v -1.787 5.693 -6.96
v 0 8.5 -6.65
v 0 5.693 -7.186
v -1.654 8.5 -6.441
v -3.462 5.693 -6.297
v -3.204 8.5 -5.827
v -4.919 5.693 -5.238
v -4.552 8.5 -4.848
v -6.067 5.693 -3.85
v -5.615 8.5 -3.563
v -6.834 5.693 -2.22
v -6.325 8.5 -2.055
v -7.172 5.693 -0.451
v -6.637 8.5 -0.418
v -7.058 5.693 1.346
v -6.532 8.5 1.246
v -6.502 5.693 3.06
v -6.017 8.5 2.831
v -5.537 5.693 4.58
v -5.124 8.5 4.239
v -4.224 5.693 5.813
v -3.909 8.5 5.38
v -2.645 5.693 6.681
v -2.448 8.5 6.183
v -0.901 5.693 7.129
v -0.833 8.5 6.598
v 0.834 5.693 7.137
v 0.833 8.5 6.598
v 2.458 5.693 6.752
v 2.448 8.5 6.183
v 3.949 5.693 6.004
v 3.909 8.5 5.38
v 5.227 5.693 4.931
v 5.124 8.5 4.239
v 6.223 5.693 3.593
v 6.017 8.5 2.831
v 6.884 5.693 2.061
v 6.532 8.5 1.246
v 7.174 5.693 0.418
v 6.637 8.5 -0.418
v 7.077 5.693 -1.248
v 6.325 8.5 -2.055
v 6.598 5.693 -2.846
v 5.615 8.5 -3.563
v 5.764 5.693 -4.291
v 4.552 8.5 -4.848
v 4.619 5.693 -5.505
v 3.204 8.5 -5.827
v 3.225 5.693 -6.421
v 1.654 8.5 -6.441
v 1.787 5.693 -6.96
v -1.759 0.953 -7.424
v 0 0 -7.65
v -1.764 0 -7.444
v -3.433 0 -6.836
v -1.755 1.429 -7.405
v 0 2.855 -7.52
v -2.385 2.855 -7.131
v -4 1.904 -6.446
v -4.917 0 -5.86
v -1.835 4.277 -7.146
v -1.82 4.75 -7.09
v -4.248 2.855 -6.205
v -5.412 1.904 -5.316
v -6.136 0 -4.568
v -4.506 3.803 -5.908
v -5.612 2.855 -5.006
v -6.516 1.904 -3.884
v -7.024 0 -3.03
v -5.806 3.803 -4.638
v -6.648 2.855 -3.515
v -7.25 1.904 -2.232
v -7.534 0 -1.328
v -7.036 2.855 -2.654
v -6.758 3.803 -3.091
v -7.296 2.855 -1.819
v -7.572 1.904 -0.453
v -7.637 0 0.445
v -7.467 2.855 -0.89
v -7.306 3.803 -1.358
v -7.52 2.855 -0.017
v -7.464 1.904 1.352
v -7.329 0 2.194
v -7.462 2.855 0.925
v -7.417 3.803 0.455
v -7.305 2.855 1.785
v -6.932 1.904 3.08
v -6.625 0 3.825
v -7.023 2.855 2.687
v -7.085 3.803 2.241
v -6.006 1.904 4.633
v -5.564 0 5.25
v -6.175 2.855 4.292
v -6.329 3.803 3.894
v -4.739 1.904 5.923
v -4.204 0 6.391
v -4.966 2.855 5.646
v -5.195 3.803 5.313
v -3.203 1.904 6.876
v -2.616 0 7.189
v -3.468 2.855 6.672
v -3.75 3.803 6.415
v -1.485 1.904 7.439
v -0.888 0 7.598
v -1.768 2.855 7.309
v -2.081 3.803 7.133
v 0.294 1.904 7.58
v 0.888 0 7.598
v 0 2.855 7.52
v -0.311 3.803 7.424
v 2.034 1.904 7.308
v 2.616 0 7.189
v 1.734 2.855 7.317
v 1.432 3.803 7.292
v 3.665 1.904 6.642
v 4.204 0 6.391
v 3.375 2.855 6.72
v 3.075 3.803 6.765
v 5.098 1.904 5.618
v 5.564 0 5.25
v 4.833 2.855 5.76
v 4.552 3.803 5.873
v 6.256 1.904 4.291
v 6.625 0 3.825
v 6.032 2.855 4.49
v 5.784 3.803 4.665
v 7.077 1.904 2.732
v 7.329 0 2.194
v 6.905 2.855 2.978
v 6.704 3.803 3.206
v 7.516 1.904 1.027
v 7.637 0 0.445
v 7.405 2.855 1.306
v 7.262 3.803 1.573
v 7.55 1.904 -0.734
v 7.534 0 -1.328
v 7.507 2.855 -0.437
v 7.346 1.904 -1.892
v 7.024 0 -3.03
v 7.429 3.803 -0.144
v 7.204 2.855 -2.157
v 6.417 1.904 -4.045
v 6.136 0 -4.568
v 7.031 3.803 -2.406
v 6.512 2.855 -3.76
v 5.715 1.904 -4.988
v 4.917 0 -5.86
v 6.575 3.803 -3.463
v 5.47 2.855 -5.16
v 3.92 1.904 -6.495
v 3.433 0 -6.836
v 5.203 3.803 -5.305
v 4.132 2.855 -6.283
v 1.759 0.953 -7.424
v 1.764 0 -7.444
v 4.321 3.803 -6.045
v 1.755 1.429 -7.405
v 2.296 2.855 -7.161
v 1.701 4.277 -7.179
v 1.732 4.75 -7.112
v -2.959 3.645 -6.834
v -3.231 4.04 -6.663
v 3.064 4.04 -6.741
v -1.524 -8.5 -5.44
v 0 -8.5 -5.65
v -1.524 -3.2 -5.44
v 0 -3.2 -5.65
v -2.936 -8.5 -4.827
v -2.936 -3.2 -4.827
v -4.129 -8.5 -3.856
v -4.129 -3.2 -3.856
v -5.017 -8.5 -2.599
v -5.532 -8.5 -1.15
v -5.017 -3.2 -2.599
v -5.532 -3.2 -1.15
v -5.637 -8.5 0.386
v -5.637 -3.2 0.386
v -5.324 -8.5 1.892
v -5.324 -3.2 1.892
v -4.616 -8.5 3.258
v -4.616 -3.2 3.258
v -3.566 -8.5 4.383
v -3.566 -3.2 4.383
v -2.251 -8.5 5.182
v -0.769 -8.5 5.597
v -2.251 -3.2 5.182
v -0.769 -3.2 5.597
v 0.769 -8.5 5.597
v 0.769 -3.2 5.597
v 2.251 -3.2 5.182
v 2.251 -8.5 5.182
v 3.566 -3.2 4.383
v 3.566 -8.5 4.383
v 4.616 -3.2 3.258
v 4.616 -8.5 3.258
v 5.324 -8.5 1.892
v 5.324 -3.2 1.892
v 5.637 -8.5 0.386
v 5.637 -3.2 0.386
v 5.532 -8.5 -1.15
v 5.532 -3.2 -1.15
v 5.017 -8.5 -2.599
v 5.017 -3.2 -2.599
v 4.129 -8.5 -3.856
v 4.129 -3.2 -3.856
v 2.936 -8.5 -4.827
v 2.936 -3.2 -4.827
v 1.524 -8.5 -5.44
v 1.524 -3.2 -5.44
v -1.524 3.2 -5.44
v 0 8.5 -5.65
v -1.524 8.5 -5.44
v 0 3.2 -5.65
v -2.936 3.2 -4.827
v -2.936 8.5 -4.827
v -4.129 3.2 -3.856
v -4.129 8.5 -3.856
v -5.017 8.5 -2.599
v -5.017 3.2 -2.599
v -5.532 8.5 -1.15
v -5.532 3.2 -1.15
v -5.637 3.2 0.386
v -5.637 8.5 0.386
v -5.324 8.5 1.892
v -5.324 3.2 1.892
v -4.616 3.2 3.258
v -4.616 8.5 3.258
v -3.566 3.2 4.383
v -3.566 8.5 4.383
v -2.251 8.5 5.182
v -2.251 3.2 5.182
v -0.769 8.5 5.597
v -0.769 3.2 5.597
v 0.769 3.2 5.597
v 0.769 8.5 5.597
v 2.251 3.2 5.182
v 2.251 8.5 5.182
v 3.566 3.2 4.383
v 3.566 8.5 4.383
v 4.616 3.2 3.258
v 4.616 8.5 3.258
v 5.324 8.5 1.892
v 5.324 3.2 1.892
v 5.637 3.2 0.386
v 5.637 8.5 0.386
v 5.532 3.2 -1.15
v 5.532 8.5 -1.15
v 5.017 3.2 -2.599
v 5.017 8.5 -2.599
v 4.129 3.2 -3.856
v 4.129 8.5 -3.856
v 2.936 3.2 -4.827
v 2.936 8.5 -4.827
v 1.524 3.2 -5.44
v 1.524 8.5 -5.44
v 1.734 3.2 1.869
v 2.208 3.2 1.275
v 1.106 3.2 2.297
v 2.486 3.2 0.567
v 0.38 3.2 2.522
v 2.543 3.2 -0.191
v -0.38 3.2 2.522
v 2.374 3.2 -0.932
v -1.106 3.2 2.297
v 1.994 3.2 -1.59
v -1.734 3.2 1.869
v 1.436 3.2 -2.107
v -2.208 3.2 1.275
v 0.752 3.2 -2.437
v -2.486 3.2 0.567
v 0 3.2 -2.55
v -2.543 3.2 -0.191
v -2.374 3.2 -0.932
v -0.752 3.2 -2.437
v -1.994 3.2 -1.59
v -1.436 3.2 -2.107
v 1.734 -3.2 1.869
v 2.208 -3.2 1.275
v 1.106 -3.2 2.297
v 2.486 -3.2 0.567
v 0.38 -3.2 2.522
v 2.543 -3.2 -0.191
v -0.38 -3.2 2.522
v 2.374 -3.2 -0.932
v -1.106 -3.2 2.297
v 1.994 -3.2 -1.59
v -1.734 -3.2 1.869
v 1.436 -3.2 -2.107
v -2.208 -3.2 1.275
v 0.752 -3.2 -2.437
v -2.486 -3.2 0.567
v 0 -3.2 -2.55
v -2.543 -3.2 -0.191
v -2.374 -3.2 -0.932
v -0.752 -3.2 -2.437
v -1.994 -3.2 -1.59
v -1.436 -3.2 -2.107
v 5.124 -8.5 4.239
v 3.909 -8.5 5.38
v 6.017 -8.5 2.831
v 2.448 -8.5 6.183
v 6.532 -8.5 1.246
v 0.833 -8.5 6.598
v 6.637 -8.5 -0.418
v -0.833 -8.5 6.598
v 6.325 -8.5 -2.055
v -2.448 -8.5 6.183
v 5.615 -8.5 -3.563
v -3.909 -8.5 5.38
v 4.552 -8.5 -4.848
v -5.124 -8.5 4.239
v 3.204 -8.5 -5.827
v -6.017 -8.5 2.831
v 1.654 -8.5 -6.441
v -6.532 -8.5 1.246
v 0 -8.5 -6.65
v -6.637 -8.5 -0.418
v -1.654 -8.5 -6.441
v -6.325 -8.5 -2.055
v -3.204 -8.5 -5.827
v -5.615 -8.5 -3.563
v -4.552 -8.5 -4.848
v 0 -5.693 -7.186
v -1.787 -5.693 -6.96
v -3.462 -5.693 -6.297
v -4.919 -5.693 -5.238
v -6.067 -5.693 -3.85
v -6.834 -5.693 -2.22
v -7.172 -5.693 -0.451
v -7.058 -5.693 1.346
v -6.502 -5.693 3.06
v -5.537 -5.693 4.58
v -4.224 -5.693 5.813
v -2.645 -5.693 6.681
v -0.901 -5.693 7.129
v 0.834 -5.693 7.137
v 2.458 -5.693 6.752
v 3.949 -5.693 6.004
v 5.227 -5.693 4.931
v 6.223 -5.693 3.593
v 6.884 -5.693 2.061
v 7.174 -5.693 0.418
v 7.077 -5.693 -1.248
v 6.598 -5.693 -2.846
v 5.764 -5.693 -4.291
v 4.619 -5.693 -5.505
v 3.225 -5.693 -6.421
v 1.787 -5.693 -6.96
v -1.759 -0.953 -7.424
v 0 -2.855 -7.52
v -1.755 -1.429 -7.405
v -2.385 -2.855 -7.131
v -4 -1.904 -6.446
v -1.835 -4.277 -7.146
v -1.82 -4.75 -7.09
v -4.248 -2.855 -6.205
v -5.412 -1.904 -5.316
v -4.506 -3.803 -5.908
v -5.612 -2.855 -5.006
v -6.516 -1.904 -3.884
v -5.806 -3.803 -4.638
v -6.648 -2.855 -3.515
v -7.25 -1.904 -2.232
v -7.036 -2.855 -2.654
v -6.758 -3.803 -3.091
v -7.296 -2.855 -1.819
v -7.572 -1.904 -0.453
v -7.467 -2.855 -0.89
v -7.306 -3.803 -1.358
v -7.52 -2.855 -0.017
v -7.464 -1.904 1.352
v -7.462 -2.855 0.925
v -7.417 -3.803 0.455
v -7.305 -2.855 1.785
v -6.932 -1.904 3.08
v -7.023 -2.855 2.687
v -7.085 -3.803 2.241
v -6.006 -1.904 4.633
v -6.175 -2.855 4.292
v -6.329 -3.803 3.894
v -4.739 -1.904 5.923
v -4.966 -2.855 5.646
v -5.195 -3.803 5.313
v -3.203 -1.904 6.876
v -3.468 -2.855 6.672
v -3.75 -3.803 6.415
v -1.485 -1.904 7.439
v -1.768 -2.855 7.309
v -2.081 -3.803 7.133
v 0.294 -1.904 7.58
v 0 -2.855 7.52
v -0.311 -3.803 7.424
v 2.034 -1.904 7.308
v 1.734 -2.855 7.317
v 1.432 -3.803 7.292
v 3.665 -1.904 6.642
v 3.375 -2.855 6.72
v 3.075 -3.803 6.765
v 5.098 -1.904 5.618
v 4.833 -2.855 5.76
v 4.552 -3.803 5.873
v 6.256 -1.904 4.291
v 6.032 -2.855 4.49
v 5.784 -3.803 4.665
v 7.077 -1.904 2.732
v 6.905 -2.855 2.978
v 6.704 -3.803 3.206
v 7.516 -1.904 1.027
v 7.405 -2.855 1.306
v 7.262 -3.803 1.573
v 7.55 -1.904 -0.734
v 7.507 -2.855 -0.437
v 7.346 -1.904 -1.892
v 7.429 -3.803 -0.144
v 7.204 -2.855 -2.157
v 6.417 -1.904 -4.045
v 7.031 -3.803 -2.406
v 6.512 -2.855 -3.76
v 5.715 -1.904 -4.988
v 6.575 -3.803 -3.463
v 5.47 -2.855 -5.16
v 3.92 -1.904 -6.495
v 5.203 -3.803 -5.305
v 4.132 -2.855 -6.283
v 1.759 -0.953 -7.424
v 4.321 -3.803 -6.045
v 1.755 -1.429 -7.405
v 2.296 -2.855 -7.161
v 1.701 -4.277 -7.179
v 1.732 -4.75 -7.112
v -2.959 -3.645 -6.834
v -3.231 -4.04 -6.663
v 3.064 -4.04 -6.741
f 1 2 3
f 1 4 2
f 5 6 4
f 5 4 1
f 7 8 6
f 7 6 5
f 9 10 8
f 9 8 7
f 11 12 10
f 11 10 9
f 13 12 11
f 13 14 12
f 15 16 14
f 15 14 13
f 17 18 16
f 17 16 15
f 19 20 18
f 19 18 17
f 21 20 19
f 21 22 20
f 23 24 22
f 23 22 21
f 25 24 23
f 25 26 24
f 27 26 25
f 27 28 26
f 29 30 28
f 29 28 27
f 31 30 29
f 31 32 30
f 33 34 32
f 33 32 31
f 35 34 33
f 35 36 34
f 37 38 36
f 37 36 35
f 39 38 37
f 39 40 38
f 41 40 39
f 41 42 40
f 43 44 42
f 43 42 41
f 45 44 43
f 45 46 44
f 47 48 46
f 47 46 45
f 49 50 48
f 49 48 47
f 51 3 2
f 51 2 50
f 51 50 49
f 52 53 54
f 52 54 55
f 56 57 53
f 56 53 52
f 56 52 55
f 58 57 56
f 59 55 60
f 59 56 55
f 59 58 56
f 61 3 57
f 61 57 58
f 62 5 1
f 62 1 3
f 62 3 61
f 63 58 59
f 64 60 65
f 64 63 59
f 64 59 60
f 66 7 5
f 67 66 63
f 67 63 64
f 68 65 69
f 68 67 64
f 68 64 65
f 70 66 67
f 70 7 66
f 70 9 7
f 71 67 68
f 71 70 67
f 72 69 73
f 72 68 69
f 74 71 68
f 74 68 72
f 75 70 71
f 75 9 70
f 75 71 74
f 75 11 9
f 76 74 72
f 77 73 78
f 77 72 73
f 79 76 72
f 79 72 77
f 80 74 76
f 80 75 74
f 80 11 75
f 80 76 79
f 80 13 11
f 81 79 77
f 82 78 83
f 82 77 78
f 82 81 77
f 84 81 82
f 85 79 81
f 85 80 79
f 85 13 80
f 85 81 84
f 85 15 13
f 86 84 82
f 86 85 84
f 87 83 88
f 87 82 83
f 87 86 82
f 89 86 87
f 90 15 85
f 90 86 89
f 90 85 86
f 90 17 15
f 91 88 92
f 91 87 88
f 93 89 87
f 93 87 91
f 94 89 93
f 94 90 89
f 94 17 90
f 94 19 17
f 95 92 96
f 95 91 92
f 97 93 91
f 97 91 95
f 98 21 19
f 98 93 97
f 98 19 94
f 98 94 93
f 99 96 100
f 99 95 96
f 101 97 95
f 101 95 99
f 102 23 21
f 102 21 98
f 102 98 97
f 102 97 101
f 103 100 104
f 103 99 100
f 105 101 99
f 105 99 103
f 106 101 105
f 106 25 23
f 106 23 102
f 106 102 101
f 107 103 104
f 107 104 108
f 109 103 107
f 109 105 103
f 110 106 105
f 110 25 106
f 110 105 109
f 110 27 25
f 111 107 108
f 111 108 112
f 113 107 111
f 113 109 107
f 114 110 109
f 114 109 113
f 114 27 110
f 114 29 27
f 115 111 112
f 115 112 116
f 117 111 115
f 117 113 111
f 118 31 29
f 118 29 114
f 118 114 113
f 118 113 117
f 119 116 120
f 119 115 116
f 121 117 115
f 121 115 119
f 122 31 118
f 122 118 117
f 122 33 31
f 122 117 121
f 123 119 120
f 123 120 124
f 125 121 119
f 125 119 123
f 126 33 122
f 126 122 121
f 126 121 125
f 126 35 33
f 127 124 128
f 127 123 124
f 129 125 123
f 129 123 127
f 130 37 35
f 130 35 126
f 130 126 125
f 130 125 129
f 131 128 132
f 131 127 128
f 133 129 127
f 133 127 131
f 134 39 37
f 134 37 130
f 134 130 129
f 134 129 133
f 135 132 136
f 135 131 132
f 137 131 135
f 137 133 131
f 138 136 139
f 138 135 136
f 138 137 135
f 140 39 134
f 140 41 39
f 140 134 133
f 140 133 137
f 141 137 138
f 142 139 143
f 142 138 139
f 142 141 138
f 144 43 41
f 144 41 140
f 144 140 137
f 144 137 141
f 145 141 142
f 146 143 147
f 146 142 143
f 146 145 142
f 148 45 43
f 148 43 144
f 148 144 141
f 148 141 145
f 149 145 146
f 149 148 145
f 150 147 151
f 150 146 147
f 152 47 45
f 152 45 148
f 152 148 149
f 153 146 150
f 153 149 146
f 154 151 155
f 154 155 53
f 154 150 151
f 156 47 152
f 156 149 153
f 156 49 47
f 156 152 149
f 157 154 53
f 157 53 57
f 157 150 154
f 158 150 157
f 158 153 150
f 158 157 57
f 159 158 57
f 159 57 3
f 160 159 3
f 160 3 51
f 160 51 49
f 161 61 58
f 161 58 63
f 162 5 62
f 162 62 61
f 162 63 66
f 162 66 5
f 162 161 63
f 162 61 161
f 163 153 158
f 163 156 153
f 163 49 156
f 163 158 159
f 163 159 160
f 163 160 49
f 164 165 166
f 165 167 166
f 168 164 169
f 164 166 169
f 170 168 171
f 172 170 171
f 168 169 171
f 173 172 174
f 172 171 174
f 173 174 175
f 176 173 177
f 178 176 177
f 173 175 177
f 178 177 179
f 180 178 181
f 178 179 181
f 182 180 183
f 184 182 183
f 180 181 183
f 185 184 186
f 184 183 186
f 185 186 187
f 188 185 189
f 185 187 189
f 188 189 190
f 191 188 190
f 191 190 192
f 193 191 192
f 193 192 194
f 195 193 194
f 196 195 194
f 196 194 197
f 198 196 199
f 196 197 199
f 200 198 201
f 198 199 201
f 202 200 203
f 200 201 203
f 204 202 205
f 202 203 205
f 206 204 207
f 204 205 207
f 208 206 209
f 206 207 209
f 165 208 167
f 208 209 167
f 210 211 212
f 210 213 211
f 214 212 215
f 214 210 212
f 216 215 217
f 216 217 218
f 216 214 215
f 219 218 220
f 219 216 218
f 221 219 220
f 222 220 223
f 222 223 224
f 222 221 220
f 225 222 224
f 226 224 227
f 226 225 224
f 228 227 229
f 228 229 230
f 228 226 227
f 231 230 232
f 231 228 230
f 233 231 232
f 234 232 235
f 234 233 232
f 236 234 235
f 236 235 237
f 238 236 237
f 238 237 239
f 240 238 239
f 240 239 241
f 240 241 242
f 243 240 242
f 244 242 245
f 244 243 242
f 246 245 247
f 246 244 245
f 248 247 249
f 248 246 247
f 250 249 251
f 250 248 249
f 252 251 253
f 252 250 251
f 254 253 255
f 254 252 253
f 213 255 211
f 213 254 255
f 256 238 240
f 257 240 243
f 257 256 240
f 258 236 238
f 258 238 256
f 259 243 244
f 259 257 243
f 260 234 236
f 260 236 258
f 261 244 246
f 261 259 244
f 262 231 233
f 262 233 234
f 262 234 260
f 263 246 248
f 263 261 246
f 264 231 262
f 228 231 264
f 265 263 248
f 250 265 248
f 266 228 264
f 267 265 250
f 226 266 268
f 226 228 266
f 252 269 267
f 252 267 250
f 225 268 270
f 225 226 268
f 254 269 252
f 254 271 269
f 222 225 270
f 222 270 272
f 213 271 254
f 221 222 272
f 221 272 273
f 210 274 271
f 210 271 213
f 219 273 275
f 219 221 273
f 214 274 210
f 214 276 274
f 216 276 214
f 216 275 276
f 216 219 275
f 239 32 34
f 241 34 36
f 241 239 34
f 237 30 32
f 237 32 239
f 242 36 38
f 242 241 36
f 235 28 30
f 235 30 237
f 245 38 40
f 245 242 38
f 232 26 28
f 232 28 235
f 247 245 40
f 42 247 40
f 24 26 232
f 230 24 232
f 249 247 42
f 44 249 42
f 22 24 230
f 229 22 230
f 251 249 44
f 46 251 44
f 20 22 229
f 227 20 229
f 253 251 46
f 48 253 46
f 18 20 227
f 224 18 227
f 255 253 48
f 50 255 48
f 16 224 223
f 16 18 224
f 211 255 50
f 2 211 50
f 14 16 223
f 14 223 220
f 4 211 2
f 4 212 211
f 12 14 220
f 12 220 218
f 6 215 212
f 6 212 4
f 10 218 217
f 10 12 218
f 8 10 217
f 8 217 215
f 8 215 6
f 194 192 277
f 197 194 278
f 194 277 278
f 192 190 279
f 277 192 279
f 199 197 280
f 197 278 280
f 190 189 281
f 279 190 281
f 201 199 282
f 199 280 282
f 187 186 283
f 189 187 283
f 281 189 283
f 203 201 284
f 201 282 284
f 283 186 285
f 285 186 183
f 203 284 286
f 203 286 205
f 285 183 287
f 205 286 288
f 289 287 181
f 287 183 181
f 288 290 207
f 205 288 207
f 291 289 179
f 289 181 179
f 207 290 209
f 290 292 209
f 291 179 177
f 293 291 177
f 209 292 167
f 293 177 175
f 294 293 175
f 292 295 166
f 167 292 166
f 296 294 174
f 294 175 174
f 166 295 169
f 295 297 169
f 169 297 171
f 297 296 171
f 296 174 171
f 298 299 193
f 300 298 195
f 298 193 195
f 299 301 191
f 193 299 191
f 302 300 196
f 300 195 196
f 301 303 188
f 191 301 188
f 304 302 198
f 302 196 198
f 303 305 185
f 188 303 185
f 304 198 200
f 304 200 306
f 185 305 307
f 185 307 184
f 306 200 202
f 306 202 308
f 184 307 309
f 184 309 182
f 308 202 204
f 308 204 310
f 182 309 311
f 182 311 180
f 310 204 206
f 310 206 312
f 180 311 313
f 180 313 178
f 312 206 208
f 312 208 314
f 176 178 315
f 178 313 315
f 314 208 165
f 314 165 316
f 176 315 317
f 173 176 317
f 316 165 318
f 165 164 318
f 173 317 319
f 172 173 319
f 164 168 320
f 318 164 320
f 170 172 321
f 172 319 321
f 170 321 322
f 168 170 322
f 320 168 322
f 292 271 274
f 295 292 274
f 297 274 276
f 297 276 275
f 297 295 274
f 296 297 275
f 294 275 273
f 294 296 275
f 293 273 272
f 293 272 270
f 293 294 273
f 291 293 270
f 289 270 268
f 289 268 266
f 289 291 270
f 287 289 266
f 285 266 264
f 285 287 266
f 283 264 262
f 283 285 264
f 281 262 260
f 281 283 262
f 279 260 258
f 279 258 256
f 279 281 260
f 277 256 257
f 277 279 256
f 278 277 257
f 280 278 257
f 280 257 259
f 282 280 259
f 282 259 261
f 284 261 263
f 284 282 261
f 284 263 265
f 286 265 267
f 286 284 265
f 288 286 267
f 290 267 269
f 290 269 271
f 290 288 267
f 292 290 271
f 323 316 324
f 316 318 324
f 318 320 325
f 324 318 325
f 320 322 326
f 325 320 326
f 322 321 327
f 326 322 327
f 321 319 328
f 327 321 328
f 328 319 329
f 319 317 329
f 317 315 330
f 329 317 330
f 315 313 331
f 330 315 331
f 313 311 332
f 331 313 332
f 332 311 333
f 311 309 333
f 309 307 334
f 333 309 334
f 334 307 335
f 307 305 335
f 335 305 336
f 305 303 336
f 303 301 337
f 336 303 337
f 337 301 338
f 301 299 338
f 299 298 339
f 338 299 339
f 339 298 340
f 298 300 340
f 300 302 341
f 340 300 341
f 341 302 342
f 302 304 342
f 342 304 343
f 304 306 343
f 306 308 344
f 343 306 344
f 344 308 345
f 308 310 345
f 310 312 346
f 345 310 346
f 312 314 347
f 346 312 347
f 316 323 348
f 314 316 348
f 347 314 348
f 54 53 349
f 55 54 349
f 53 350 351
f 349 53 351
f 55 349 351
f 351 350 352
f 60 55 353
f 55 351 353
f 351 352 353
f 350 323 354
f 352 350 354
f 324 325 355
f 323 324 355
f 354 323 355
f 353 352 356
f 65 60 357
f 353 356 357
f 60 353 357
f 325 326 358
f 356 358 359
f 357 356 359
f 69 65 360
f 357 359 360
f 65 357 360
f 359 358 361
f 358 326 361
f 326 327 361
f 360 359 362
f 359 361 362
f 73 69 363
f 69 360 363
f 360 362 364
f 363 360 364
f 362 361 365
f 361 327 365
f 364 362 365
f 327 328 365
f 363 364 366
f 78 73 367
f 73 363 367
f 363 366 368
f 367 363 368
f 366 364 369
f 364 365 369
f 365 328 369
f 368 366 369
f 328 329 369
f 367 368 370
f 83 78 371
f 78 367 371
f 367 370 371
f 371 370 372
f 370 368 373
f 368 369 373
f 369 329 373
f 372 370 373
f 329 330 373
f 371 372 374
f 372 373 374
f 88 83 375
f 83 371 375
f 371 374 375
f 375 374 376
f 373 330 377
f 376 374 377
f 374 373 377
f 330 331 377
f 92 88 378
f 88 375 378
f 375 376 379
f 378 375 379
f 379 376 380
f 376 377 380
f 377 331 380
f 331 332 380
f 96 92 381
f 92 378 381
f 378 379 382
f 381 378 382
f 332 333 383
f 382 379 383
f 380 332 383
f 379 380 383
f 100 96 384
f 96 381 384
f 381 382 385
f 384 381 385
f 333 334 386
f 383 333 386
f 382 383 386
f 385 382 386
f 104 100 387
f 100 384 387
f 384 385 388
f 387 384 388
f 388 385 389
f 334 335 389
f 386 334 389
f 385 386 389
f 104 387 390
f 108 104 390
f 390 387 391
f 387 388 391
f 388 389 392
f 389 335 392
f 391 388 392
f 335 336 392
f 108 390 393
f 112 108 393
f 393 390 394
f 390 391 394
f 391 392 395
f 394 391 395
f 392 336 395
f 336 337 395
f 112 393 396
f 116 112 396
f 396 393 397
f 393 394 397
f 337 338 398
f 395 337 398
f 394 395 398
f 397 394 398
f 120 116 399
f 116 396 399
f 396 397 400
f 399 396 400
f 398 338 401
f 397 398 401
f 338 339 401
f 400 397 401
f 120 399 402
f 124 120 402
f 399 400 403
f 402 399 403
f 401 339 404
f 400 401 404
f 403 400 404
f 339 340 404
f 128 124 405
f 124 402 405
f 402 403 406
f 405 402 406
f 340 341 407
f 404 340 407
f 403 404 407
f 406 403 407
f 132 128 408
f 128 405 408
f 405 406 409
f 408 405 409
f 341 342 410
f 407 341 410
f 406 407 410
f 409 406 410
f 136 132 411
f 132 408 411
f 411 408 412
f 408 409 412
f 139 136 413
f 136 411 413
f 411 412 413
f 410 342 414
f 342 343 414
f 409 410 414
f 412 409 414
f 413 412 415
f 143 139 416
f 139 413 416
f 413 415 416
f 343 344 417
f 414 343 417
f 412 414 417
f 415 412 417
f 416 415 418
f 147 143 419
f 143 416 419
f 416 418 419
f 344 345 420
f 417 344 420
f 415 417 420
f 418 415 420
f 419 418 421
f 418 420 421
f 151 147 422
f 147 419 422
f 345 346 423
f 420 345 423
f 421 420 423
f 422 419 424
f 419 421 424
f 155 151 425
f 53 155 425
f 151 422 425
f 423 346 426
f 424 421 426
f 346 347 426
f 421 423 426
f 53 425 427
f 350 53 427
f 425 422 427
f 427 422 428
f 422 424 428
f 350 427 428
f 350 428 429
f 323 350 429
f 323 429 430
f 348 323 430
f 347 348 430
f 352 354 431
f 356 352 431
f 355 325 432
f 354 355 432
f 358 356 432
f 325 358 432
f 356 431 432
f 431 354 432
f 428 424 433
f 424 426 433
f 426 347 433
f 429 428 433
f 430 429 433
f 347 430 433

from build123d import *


with BuildPart() as part:
    # Sketch1 → Revolve1 (revolve)
    with BuildSketch(Plane.XY, mode=Mode.PRIVATE) as revolve1_sk:
        with BuildLine():
            Line((5.65, -3.2), (2.55, -3.2))
            Line((2.55, -3.2), (2.55, 0))
            Line((2.55, 0), (7.65, 0))
            ThreePointArc((7.65, 0), (7.37799262, -4.276822661), (6.65, -8.5))
            Line((6.65, -8.5), (5.65, -8.5))
            Line((5.65, -8.5), (5.65, -3.2))
        make_face()
    revolve1 = revolve(revolve1_sk.sketch.rotate(Axis((0, -14.57105974, 0), (0, 1, 0)), 90), axis=Axis((0, -14.57105974, 0), (0, 1, 0)))

    # Mirror1: Revolve1 across plane
    add(revolve1.mirror(Plane(origin=(2.55, 0, 0), x_dir=(0, 0, 1), z_dir=(0, 1, 0))))


solid = part.part
